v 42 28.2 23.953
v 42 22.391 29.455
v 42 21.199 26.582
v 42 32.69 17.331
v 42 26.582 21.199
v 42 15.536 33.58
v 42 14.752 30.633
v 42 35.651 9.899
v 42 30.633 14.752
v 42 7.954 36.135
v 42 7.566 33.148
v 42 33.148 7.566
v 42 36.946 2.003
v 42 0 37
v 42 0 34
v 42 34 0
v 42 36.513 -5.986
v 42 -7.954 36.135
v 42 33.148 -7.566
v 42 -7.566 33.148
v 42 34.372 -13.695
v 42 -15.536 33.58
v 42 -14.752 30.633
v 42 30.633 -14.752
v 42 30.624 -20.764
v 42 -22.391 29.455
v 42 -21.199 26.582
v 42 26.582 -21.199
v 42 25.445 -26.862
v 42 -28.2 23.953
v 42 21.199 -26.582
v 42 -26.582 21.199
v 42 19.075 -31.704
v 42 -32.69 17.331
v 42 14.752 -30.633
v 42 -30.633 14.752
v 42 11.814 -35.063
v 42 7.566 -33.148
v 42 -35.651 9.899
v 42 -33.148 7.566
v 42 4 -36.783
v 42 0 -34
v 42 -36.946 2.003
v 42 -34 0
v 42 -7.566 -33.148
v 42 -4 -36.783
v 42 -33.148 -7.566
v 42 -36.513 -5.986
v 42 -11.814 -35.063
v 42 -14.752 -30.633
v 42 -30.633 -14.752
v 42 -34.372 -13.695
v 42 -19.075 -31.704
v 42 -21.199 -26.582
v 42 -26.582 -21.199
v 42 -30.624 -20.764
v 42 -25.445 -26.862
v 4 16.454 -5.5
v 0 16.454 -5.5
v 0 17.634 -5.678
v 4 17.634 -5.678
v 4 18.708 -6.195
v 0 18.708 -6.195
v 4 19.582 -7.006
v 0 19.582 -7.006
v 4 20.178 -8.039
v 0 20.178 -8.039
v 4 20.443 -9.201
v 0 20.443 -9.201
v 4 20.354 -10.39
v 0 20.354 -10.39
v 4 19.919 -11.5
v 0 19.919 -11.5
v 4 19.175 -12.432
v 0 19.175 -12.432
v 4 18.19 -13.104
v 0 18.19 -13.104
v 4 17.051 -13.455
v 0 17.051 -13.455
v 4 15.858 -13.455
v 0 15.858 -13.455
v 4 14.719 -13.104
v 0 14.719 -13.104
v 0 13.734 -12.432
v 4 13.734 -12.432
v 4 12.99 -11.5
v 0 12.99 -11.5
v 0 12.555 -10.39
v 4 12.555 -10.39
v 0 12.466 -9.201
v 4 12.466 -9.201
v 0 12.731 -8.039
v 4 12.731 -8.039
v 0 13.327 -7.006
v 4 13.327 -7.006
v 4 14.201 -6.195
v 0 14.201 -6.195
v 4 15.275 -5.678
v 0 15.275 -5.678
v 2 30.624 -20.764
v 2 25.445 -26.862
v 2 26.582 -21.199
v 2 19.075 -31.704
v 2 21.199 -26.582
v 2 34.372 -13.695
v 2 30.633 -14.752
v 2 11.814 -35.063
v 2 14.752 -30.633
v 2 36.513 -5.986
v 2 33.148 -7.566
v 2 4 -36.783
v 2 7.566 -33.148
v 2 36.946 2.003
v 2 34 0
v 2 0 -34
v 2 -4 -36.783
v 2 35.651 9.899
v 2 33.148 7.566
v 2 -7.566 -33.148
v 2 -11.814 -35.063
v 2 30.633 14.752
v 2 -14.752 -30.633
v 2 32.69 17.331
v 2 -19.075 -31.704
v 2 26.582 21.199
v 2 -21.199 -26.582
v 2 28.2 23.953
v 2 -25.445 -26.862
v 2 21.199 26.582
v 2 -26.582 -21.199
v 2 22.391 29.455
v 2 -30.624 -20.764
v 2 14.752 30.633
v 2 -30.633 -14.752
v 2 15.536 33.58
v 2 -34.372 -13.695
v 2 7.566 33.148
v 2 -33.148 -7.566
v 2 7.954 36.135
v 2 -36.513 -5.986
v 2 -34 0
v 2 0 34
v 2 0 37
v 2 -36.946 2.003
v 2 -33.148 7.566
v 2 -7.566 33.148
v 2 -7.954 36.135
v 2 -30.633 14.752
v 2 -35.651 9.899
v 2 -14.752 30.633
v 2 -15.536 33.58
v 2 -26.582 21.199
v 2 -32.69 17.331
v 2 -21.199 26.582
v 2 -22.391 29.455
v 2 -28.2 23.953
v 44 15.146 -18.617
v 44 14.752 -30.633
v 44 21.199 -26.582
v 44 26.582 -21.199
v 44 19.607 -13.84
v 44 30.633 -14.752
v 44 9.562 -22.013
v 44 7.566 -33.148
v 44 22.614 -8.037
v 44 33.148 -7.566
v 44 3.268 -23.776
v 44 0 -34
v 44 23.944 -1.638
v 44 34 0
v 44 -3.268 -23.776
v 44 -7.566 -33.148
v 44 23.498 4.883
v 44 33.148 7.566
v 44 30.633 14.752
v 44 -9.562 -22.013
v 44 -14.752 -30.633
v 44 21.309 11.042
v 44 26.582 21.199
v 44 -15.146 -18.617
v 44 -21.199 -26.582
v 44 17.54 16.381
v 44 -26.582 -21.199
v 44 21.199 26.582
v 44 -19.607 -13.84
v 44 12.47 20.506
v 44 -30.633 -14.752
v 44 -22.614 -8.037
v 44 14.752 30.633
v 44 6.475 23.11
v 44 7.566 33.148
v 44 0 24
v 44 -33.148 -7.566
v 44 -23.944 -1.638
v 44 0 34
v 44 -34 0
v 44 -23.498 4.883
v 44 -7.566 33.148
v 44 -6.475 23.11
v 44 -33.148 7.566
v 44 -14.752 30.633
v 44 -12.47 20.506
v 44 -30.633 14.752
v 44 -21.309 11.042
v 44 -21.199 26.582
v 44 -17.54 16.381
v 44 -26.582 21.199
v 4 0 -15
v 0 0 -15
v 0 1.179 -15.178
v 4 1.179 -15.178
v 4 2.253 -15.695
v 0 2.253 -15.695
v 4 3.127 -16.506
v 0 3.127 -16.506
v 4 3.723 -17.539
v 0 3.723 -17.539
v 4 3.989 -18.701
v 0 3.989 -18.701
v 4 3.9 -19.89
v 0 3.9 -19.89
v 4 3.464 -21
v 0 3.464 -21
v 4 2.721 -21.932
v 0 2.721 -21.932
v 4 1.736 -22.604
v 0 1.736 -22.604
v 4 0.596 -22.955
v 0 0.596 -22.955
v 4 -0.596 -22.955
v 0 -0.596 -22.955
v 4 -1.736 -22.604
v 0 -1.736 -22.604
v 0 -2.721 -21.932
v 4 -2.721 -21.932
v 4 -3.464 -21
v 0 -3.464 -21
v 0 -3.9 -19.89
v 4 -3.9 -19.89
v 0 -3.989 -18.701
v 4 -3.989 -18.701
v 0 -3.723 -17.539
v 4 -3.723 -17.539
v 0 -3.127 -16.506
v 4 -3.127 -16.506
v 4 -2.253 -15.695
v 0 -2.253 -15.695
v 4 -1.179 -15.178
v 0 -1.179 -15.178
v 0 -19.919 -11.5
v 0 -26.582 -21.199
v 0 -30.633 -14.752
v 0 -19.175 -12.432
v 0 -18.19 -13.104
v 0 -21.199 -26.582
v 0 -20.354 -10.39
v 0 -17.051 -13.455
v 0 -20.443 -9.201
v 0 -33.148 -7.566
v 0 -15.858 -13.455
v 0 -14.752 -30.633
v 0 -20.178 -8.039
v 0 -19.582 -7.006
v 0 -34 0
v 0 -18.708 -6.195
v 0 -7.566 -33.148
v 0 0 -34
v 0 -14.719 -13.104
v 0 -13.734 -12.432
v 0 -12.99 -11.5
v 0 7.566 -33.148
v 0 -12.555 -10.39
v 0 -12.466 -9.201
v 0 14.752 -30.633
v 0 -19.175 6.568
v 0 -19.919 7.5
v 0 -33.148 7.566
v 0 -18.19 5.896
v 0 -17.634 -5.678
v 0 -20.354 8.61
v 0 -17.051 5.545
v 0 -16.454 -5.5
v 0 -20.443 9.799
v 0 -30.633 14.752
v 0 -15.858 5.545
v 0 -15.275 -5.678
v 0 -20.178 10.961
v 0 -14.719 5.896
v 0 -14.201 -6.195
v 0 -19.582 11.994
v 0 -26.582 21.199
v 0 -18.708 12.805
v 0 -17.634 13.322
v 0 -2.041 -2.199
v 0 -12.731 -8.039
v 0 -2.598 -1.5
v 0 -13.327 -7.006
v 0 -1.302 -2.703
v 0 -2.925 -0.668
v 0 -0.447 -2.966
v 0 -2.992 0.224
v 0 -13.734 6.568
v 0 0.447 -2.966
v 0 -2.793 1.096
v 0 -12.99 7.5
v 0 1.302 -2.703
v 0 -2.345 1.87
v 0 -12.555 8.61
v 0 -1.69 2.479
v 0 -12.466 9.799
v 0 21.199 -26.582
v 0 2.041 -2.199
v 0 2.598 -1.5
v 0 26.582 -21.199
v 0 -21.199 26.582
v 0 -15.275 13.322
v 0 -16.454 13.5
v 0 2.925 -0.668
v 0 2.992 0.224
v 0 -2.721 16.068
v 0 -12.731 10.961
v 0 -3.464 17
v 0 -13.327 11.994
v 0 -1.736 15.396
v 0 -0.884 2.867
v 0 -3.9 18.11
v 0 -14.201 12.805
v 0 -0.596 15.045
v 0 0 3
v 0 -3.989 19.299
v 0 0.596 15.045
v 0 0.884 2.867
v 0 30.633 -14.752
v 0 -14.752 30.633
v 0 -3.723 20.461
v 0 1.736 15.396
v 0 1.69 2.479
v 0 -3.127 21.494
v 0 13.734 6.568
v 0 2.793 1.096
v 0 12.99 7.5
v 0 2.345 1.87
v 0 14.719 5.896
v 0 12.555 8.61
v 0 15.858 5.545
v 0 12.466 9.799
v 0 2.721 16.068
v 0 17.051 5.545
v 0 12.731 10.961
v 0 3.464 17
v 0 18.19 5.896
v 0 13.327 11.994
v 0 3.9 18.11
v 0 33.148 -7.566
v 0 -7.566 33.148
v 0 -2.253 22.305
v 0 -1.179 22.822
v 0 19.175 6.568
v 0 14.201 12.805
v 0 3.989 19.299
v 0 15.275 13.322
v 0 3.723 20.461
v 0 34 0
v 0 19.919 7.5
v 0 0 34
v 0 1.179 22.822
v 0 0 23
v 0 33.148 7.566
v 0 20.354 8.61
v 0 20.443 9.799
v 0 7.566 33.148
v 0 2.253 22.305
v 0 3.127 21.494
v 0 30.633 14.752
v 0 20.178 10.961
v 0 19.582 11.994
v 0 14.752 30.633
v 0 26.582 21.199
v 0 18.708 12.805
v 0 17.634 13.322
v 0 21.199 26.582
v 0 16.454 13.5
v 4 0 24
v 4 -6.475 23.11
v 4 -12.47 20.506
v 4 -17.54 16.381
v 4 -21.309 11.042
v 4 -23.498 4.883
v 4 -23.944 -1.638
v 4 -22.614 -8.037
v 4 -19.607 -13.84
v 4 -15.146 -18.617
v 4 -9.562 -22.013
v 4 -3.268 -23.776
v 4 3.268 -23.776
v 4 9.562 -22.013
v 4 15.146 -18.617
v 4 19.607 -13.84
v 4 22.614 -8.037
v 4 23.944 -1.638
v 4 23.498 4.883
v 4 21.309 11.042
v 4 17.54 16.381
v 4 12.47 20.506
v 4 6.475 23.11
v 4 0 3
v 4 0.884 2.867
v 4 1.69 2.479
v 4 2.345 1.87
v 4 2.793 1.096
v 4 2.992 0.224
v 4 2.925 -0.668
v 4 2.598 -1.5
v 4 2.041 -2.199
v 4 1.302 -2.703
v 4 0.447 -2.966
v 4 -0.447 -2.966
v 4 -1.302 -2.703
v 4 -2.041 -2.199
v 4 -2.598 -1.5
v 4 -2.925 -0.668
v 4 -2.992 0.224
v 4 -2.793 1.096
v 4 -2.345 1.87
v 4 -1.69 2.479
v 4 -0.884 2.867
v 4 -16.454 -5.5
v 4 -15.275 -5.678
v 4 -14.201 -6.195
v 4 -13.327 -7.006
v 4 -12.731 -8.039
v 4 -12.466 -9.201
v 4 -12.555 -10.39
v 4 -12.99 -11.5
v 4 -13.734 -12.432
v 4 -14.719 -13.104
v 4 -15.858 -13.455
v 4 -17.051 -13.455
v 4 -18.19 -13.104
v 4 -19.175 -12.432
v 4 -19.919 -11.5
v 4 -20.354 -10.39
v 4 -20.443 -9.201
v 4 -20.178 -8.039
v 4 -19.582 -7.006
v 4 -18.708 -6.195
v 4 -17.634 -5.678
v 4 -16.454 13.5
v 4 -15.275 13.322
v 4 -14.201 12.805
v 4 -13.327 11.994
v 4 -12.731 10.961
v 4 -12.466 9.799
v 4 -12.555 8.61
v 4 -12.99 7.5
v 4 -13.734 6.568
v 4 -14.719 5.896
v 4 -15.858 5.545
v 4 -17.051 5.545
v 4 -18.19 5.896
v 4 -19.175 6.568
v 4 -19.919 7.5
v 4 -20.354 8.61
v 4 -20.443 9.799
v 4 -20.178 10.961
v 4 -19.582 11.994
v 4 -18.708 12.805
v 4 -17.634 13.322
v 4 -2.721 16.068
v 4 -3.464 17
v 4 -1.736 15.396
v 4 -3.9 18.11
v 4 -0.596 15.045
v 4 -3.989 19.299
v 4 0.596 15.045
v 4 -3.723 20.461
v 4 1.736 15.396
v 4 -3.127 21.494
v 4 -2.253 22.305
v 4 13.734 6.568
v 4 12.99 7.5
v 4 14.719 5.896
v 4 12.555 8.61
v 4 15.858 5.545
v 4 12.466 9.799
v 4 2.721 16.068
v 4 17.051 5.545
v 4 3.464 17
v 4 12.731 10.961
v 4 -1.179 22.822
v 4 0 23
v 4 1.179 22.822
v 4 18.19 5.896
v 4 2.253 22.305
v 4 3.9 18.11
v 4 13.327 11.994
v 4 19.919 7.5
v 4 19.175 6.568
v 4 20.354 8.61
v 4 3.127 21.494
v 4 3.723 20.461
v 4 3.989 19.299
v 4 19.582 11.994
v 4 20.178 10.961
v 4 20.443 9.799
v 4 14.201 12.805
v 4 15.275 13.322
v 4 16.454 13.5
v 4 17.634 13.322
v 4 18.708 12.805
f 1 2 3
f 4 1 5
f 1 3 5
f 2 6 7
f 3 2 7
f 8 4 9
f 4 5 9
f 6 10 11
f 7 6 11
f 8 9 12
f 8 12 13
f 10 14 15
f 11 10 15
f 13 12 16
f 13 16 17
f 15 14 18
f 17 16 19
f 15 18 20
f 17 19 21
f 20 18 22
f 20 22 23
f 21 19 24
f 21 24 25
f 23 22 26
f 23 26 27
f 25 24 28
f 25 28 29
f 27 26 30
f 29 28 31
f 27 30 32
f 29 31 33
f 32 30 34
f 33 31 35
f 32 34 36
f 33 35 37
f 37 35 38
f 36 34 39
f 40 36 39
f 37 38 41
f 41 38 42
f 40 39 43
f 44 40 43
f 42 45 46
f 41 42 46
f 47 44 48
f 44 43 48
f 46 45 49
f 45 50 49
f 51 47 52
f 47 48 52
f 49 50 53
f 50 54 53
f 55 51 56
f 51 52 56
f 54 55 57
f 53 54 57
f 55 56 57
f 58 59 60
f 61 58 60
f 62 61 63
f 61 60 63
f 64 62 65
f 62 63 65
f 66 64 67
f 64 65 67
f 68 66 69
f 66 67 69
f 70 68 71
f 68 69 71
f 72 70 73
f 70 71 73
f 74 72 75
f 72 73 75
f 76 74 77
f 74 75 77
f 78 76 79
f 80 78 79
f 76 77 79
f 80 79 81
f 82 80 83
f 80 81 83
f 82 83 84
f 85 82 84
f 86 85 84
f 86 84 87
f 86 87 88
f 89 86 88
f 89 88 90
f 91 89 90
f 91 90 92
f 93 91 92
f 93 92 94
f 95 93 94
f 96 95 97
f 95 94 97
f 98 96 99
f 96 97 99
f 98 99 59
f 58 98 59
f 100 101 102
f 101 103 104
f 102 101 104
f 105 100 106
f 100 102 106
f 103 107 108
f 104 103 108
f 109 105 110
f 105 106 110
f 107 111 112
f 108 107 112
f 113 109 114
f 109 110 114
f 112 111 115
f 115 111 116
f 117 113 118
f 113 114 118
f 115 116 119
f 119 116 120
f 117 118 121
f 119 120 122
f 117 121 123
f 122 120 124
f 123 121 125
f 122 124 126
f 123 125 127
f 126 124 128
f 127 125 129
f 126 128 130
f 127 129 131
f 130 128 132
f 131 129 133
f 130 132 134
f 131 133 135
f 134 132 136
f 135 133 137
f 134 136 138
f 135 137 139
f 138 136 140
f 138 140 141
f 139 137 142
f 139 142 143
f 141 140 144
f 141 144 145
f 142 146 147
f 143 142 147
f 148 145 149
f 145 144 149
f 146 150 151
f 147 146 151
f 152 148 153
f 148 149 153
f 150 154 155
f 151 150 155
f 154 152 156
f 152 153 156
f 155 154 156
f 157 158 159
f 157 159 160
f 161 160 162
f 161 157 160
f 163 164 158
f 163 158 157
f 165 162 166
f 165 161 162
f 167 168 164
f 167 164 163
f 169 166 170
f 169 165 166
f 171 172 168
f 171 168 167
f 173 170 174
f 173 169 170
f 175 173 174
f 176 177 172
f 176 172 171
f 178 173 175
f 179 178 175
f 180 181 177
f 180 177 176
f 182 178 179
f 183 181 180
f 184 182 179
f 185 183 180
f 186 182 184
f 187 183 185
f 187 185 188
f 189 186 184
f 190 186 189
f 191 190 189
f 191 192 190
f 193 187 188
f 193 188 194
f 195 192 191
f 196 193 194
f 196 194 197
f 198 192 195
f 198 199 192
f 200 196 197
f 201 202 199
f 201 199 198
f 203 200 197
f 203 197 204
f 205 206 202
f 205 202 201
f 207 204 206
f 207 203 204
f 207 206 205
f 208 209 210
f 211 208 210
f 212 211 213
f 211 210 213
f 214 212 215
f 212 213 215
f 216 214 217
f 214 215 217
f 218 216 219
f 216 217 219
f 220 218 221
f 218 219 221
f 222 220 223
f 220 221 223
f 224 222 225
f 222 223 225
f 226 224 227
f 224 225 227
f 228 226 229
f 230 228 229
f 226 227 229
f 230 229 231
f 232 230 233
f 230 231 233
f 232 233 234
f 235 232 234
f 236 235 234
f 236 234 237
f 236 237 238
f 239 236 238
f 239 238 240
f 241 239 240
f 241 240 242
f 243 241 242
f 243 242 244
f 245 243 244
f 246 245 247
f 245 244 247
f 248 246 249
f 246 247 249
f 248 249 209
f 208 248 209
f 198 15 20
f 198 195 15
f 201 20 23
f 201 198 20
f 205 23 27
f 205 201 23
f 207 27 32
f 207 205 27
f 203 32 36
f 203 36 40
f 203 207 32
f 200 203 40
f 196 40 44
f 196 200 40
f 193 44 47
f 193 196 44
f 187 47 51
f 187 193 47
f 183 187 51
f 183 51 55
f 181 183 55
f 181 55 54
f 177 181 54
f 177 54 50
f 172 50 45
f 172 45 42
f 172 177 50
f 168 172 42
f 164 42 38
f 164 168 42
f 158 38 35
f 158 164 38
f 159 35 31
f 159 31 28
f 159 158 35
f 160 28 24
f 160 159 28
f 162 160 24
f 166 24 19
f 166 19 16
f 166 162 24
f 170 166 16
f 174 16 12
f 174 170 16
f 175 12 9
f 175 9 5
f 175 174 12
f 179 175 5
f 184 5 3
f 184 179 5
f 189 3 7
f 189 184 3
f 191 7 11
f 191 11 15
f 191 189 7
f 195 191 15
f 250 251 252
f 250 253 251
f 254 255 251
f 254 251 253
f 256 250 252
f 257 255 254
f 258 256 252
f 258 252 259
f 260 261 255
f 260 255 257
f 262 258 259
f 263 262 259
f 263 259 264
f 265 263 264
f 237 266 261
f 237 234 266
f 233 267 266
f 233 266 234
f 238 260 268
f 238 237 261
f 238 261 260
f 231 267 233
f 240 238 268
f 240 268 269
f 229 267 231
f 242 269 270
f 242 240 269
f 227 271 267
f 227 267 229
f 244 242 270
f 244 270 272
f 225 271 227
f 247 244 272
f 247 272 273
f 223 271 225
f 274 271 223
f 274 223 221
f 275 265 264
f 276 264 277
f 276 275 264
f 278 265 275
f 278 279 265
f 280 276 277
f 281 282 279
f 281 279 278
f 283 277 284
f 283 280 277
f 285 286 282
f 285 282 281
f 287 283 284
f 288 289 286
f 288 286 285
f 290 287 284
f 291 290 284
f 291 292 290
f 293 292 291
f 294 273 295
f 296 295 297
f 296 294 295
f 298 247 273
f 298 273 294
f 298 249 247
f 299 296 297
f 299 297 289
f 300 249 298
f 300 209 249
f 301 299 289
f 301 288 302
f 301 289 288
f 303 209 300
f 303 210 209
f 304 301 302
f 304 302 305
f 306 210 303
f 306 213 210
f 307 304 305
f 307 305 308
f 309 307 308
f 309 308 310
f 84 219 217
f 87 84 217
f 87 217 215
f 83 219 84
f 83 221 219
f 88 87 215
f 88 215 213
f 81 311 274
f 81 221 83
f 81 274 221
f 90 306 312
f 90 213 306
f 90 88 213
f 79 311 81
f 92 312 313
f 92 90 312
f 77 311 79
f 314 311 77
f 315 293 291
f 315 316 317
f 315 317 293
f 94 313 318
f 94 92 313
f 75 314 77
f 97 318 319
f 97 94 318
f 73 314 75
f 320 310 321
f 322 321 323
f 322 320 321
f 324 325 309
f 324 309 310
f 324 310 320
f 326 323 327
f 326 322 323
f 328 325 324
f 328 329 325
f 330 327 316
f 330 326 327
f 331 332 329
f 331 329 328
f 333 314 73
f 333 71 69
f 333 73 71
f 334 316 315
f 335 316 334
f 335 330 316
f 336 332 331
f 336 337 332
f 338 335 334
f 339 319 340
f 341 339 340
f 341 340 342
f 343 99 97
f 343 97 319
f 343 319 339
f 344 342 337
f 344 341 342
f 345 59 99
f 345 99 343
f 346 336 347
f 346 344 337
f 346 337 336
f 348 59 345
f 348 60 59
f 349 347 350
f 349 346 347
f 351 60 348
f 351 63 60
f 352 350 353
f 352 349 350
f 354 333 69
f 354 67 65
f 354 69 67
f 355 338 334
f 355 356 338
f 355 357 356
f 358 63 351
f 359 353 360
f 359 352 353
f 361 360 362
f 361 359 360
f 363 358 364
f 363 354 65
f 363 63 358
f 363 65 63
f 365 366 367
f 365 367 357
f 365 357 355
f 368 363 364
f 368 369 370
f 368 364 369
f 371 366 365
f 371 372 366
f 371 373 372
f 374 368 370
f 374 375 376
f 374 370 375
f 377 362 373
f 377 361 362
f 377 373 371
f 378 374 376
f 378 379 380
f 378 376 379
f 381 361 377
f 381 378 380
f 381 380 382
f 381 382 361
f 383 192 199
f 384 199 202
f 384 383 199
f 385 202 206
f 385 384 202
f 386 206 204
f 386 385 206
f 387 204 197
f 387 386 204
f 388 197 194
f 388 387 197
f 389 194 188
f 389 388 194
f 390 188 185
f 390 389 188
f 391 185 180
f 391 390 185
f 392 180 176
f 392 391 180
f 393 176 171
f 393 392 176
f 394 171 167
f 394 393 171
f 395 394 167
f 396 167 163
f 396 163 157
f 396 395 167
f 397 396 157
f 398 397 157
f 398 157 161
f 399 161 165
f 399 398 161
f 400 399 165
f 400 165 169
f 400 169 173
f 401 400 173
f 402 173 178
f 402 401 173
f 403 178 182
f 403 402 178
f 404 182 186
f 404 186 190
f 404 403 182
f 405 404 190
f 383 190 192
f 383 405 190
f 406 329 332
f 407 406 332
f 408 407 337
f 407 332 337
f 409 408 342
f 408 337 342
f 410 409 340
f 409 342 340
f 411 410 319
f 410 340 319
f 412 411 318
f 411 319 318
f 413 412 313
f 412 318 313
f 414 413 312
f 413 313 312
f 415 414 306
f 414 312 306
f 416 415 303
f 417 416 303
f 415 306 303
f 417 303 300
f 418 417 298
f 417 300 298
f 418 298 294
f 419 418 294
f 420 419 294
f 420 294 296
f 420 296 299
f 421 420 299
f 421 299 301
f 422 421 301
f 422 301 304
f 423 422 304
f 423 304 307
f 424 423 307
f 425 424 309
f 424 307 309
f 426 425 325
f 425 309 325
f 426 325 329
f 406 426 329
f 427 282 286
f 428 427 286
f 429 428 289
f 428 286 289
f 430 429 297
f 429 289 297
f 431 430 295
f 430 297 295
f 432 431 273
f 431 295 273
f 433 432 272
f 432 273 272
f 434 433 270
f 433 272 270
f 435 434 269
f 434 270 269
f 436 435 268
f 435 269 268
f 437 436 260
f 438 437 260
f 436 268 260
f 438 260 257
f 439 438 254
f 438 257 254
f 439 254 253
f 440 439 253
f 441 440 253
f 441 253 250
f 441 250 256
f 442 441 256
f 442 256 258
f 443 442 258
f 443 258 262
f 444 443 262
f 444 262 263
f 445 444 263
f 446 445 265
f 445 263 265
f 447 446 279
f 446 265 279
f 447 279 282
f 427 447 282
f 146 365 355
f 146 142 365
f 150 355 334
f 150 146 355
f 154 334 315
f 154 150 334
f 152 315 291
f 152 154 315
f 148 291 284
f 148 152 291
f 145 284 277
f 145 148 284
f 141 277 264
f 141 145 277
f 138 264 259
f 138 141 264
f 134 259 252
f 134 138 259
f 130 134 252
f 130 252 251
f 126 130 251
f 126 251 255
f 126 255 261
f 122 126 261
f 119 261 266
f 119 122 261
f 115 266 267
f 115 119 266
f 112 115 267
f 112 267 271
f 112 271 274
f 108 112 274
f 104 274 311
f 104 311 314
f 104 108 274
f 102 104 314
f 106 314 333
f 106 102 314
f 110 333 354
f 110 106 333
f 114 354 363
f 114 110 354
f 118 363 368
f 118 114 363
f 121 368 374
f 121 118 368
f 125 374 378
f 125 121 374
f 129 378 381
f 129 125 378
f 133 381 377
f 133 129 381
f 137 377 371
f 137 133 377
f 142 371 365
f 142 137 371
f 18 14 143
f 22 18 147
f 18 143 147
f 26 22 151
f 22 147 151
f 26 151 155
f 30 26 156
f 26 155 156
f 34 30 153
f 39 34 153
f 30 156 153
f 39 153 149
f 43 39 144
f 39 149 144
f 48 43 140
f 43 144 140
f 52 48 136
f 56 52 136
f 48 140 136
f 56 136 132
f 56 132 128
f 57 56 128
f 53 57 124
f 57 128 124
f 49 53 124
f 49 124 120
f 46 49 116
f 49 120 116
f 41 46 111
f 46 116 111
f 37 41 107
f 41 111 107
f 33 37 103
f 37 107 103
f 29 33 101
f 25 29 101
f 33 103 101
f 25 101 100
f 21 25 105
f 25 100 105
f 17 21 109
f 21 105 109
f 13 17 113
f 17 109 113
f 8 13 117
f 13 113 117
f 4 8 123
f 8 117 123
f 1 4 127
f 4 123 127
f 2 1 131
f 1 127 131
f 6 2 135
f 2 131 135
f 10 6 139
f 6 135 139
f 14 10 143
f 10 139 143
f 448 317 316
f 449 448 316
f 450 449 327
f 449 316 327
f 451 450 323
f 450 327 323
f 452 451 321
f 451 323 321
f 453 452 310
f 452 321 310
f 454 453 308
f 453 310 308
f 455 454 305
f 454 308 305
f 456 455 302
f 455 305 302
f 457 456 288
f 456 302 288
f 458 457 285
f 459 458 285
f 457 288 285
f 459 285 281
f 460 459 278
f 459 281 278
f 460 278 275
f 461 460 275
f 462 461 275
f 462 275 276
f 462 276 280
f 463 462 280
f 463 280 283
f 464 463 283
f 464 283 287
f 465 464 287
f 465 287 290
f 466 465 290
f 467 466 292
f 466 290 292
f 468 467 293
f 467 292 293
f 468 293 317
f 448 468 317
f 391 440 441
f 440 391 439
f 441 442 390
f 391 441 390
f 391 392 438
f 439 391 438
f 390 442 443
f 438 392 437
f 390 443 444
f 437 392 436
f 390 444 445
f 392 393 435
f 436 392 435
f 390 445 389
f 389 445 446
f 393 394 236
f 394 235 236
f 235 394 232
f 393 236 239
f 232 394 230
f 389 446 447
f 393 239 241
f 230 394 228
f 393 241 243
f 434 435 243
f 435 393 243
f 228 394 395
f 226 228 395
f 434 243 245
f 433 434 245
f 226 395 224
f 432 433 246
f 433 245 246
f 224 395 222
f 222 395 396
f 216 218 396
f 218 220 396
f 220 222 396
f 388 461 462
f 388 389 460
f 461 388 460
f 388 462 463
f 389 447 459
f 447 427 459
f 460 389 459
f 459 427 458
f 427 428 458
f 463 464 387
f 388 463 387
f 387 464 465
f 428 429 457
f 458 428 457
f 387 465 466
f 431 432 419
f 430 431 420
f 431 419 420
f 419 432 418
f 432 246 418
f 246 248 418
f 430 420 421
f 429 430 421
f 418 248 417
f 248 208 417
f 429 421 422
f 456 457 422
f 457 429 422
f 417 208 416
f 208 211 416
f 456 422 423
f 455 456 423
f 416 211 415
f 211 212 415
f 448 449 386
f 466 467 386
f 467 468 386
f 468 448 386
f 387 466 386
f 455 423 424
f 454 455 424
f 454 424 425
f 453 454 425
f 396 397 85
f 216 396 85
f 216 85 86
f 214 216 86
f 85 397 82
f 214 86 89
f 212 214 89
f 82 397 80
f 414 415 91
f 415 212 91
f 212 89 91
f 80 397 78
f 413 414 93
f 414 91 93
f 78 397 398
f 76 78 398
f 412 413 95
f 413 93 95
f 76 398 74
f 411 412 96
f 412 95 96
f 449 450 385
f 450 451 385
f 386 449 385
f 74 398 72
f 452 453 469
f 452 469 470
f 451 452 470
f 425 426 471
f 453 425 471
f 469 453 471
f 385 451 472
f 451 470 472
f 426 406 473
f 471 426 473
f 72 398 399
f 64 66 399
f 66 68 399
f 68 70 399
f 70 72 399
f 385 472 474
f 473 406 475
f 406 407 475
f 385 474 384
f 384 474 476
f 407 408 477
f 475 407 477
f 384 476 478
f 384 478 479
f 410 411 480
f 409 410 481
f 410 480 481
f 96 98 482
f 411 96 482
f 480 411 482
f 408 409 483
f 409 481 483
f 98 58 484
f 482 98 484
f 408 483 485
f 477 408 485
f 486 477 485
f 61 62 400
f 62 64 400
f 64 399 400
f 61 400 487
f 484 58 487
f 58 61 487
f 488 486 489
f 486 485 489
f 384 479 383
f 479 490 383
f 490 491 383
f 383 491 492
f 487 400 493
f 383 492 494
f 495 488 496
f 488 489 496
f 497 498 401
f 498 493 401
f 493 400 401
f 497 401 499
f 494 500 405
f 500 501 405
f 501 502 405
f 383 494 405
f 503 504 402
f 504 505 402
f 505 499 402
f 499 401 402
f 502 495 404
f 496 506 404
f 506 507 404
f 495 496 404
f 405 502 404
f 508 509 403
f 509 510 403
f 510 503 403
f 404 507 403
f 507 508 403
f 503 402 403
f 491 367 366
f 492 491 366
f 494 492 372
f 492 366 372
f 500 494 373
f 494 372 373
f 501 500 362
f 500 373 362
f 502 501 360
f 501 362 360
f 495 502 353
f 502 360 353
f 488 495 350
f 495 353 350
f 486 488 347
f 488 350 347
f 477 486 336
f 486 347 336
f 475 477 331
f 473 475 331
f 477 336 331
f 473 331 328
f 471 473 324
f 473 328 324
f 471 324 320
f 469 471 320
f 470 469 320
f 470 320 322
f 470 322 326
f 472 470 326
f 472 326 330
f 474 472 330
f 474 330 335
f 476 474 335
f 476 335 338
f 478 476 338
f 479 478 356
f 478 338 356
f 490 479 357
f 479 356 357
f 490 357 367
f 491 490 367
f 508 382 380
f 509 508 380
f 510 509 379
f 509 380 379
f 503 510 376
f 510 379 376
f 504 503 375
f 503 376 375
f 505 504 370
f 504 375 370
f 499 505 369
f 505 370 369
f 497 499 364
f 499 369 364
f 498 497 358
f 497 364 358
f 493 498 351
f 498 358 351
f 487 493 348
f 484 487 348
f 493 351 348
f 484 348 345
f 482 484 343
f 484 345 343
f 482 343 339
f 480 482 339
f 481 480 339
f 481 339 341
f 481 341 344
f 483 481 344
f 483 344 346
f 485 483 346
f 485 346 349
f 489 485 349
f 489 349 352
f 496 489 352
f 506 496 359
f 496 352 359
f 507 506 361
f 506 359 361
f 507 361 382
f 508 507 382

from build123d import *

# Parameters (mm, degrees)
SKETCH3_R           = 24
SKETCH3_R_2         = 4
SKETCH3_R_3         = 3
BOSS_EXTRUDE1_DEPTH = 4


with BuildPart() as part:
    # Sketch1 → Revolve2 (revolve)
    with BuildSketch(Plane.XY, mode=Mode.PRIVATE) as revolve2_sk:
        Polygon((0, 24), (0, 34), (2, 34), (2, 30), (42, 30), (42, 34), (44, 34), (44, 24), align=None)
    revolve(revolve2_sk.sketch.rotate(Axis((0, 0, 0), (1, 0, 0)), 90), axis=Axis((0, 0, 0), (1, 0, 0)))

    # Sketch2 → Revolve3 (revolve)
    with BuildSketch(Plane.XY, mode=Mode.PRIVATE) as revolve3_sk:
        Polygon((2, 34), (2, 30), (42, 30), (42, 34), (42, 37), (2, 37), align=None)
    revolve(revolve3_sk.sketch.rotate(Axis((0, 0, 0), (1, 0, 0)), 90), axis=Axis((0, 0, 0), (1, 0, 0)))

    # Sketch3 → Boss-Extrude1 (add)
    with BuildSketch(Plane.ZY):
        Circle(SKETCH3_R)
        with Locations((19, 0)):
            Circle(SKETCH3_R_2, mode=Mode.SUBTRACT)
        Circle(SKETCH3_R_3, mode=Mode.SUBTRACT)
        with Locations((9.5, -16.454482672)):
            Circle(SKETCH3_R_2, mode=Mode.SUBTRACT)
        with Locations((-9.5, -16.454482672)):
            Circle(SKETCH3_R_2, mode=Mode.SUBTRACT)
        with Locations((-19, 0)):
            Circle(SKETCH3_R_2, mode=Mode.SUBTRACT)
        with Locations((-9.5, 16.454482672)):
            Circle(SKETCH3_R_2, mode=Mode.SUBTRACT)
        with Locations((9.5, 16.454482672)):
            Circle(SKETCH3_R_2, mode=Mode.SUBTRACT)
    extrude(amount=-BOSS_EXTRUDE1_DEPTH)


solid = part.part
